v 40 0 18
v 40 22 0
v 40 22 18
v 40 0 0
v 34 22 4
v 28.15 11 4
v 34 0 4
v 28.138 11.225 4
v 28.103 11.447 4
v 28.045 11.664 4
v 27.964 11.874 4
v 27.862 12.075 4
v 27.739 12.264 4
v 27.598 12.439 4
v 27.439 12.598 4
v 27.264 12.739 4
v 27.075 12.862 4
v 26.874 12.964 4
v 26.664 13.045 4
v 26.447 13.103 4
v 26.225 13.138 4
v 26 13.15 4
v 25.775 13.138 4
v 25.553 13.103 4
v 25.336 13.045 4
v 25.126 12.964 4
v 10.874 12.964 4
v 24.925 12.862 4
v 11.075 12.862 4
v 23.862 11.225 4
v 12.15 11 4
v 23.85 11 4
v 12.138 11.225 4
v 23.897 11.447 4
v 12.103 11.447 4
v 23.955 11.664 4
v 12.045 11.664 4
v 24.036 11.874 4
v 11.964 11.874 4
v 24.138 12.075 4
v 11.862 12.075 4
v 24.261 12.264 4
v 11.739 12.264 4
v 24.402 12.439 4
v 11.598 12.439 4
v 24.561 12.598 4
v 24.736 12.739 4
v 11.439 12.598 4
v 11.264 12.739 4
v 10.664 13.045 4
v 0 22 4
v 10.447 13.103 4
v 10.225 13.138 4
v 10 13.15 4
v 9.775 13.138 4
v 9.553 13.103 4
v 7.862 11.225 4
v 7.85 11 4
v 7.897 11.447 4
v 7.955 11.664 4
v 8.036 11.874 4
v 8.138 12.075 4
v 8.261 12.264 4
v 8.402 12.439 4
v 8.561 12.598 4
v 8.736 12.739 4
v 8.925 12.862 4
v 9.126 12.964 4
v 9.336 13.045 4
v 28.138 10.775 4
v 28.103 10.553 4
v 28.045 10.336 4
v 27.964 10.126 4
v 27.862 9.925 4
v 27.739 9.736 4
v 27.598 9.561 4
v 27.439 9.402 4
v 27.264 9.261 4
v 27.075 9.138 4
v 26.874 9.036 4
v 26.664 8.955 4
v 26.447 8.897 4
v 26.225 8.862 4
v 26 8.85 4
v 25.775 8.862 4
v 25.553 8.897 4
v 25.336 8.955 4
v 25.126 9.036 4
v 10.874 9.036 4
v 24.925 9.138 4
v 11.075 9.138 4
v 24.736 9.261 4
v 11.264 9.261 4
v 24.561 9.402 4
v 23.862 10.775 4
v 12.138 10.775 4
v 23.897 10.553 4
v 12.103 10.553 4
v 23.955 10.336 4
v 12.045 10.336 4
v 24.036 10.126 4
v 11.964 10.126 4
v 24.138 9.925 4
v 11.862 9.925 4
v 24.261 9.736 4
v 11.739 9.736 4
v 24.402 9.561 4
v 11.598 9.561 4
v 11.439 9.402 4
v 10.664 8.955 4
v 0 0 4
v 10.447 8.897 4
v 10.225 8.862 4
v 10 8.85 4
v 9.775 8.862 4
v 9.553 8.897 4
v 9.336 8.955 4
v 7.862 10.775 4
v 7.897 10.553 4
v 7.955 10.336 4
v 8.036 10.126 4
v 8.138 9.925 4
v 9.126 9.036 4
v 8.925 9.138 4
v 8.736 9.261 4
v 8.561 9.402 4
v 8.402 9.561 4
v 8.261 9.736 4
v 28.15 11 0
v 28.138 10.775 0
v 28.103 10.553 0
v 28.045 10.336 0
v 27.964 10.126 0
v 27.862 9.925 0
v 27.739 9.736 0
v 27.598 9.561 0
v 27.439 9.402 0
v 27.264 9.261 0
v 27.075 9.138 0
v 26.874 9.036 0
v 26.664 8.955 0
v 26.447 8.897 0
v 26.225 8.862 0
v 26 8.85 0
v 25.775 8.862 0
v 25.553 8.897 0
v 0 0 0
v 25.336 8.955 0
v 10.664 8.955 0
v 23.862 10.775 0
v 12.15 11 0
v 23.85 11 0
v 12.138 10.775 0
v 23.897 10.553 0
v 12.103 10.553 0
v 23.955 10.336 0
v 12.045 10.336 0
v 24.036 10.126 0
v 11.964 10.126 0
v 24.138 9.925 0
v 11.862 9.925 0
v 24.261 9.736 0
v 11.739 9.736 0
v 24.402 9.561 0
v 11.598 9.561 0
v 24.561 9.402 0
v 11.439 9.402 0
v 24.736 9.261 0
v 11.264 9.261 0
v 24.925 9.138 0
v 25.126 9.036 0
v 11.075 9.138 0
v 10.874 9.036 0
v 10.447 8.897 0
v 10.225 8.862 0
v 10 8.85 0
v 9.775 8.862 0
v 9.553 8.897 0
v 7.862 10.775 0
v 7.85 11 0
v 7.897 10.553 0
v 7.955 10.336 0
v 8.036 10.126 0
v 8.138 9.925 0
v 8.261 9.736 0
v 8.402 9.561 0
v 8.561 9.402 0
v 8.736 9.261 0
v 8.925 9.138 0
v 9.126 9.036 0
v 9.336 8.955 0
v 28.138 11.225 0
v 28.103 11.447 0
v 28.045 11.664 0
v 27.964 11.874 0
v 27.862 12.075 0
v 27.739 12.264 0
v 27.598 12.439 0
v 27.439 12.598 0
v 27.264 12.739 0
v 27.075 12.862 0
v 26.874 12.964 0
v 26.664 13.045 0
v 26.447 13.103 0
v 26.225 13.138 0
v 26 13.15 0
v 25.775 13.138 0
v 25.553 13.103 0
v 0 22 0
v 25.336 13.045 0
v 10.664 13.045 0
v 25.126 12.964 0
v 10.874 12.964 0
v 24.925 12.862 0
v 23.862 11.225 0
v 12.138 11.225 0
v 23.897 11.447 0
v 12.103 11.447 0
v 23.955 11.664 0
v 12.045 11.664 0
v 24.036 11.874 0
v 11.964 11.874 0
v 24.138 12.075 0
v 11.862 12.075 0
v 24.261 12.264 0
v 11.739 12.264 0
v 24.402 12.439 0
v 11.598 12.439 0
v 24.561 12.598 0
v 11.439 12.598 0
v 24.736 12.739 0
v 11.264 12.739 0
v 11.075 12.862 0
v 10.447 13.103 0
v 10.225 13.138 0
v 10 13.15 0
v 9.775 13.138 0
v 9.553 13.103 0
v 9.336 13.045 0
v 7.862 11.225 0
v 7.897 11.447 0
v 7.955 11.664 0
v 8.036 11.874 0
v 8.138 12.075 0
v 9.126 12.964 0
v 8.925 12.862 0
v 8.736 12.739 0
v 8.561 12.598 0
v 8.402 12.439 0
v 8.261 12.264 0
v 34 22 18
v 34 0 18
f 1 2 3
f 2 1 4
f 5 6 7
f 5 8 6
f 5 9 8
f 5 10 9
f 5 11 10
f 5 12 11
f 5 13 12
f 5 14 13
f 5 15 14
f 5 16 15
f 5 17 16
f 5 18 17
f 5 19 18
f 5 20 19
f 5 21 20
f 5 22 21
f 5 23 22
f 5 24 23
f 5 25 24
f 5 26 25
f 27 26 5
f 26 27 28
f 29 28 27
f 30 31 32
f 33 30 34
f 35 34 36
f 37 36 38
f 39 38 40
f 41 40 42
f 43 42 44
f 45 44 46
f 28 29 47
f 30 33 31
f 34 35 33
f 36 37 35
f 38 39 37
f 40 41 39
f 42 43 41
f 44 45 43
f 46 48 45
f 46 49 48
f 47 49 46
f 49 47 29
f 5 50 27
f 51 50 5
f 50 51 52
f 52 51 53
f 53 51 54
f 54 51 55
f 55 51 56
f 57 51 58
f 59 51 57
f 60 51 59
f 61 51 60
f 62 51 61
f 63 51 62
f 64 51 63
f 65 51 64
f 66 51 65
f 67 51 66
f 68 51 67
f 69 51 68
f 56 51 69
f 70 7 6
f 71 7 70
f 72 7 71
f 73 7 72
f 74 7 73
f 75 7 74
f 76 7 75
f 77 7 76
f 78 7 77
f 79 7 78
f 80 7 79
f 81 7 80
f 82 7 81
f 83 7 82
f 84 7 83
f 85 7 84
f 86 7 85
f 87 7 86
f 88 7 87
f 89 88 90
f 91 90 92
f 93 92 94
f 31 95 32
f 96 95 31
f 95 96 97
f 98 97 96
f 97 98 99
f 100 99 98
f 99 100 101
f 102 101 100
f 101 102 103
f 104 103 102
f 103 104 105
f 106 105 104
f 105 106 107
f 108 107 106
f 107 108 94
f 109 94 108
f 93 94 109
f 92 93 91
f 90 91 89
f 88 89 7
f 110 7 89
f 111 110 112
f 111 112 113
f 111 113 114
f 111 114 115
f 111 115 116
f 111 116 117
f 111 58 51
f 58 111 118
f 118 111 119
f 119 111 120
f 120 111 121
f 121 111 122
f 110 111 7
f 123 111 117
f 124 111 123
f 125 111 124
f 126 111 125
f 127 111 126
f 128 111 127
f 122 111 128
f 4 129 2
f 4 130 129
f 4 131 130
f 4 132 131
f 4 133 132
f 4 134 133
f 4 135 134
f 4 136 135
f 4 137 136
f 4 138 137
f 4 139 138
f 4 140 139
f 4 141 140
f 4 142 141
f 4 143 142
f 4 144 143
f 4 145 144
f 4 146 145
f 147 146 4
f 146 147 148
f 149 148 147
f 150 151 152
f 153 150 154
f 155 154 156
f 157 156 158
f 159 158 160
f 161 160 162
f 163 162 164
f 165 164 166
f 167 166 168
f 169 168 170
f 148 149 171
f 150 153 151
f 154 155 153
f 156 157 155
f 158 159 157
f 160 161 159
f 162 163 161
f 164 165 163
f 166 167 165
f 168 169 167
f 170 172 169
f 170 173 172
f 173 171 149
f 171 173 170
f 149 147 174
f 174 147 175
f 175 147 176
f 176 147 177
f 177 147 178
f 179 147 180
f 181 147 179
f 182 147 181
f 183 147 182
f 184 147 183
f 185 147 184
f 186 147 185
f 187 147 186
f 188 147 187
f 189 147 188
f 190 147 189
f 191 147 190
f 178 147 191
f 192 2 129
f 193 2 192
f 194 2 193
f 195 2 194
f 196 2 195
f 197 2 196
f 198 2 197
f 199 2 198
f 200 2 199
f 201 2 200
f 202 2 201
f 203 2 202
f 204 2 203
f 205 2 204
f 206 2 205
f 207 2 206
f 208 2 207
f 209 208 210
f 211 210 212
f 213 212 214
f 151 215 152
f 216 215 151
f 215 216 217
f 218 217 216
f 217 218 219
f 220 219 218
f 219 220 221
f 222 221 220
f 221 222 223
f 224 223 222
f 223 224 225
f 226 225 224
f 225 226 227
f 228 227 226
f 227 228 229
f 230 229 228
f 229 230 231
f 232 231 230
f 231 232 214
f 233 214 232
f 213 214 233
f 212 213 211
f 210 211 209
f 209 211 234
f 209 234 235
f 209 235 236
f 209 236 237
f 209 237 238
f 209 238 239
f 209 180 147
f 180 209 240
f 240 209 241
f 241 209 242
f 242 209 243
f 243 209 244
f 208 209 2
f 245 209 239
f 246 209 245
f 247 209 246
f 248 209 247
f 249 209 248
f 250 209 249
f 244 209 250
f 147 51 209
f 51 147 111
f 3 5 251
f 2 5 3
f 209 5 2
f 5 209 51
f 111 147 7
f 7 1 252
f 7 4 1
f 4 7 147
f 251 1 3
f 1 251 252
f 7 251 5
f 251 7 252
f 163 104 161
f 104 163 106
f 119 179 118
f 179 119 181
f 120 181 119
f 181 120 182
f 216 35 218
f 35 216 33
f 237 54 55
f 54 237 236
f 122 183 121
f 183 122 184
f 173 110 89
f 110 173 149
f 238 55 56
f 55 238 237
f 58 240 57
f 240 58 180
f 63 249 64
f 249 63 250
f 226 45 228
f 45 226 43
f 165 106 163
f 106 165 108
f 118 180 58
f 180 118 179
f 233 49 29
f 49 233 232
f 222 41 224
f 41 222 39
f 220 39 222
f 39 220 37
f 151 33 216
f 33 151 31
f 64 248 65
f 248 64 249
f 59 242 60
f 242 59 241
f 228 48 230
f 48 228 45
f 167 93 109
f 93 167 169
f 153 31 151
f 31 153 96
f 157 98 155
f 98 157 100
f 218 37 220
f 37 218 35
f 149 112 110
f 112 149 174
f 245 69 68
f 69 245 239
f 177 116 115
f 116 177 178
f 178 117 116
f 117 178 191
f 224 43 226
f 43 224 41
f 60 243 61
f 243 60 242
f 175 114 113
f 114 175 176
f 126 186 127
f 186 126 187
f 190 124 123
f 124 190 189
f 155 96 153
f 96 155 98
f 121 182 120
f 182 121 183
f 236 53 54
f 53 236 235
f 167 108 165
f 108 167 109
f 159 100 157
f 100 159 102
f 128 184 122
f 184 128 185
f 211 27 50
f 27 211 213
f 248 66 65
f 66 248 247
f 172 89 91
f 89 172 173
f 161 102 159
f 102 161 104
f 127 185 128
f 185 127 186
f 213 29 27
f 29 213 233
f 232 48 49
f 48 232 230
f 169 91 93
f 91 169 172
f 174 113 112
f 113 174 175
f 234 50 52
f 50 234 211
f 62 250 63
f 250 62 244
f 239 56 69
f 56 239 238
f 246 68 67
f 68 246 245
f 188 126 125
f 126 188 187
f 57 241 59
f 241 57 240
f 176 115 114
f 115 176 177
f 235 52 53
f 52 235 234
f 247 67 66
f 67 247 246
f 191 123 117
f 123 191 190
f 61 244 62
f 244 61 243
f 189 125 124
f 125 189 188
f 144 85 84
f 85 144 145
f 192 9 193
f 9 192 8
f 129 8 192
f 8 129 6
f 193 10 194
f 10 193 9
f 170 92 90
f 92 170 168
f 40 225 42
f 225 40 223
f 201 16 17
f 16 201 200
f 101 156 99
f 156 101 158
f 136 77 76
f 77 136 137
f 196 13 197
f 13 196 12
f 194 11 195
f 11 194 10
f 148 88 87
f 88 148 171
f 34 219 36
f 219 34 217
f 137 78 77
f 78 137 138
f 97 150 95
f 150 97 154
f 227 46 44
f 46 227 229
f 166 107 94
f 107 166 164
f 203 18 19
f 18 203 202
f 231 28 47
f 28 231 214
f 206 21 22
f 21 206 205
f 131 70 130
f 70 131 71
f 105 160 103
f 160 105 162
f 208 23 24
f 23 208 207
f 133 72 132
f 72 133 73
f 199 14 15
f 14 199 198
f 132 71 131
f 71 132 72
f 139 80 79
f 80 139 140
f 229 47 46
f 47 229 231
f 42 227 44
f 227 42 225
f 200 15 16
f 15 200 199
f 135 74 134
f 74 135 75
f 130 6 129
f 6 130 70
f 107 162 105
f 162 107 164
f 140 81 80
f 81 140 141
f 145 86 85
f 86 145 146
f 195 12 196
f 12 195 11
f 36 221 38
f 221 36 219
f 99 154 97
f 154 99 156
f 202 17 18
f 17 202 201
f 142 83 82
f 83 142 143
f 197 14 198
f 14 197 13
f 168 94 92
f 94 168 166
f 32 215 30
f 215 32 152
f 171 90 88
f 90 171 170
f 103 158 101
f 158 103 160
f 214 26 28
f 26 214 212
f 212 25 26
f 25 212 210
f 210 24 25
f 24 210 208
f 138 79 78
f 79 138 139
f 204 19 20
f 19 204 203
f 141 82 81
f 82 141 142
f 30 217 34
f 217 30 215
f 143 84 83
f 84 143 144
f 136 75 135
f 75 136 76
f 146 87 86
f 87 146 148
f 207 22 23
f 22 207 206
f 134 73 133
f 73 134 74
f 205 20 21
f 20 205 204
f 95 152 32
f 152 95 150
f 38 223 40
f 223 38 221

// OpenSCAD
// Latch catch plate.
$fn = 60;
eps = 0.02;
length = 40;
height = 14;
width = 22;
thickness = 4;
difference() {
    union() { cube([length,width,thickness]); translate([length-6,0,thickness]) cube([6,width,height]); }
    for(x=[10,length-14]) translate([x,width/2,-eps]) cylinder(d=4.3,h=thickness+2*eps);
}
